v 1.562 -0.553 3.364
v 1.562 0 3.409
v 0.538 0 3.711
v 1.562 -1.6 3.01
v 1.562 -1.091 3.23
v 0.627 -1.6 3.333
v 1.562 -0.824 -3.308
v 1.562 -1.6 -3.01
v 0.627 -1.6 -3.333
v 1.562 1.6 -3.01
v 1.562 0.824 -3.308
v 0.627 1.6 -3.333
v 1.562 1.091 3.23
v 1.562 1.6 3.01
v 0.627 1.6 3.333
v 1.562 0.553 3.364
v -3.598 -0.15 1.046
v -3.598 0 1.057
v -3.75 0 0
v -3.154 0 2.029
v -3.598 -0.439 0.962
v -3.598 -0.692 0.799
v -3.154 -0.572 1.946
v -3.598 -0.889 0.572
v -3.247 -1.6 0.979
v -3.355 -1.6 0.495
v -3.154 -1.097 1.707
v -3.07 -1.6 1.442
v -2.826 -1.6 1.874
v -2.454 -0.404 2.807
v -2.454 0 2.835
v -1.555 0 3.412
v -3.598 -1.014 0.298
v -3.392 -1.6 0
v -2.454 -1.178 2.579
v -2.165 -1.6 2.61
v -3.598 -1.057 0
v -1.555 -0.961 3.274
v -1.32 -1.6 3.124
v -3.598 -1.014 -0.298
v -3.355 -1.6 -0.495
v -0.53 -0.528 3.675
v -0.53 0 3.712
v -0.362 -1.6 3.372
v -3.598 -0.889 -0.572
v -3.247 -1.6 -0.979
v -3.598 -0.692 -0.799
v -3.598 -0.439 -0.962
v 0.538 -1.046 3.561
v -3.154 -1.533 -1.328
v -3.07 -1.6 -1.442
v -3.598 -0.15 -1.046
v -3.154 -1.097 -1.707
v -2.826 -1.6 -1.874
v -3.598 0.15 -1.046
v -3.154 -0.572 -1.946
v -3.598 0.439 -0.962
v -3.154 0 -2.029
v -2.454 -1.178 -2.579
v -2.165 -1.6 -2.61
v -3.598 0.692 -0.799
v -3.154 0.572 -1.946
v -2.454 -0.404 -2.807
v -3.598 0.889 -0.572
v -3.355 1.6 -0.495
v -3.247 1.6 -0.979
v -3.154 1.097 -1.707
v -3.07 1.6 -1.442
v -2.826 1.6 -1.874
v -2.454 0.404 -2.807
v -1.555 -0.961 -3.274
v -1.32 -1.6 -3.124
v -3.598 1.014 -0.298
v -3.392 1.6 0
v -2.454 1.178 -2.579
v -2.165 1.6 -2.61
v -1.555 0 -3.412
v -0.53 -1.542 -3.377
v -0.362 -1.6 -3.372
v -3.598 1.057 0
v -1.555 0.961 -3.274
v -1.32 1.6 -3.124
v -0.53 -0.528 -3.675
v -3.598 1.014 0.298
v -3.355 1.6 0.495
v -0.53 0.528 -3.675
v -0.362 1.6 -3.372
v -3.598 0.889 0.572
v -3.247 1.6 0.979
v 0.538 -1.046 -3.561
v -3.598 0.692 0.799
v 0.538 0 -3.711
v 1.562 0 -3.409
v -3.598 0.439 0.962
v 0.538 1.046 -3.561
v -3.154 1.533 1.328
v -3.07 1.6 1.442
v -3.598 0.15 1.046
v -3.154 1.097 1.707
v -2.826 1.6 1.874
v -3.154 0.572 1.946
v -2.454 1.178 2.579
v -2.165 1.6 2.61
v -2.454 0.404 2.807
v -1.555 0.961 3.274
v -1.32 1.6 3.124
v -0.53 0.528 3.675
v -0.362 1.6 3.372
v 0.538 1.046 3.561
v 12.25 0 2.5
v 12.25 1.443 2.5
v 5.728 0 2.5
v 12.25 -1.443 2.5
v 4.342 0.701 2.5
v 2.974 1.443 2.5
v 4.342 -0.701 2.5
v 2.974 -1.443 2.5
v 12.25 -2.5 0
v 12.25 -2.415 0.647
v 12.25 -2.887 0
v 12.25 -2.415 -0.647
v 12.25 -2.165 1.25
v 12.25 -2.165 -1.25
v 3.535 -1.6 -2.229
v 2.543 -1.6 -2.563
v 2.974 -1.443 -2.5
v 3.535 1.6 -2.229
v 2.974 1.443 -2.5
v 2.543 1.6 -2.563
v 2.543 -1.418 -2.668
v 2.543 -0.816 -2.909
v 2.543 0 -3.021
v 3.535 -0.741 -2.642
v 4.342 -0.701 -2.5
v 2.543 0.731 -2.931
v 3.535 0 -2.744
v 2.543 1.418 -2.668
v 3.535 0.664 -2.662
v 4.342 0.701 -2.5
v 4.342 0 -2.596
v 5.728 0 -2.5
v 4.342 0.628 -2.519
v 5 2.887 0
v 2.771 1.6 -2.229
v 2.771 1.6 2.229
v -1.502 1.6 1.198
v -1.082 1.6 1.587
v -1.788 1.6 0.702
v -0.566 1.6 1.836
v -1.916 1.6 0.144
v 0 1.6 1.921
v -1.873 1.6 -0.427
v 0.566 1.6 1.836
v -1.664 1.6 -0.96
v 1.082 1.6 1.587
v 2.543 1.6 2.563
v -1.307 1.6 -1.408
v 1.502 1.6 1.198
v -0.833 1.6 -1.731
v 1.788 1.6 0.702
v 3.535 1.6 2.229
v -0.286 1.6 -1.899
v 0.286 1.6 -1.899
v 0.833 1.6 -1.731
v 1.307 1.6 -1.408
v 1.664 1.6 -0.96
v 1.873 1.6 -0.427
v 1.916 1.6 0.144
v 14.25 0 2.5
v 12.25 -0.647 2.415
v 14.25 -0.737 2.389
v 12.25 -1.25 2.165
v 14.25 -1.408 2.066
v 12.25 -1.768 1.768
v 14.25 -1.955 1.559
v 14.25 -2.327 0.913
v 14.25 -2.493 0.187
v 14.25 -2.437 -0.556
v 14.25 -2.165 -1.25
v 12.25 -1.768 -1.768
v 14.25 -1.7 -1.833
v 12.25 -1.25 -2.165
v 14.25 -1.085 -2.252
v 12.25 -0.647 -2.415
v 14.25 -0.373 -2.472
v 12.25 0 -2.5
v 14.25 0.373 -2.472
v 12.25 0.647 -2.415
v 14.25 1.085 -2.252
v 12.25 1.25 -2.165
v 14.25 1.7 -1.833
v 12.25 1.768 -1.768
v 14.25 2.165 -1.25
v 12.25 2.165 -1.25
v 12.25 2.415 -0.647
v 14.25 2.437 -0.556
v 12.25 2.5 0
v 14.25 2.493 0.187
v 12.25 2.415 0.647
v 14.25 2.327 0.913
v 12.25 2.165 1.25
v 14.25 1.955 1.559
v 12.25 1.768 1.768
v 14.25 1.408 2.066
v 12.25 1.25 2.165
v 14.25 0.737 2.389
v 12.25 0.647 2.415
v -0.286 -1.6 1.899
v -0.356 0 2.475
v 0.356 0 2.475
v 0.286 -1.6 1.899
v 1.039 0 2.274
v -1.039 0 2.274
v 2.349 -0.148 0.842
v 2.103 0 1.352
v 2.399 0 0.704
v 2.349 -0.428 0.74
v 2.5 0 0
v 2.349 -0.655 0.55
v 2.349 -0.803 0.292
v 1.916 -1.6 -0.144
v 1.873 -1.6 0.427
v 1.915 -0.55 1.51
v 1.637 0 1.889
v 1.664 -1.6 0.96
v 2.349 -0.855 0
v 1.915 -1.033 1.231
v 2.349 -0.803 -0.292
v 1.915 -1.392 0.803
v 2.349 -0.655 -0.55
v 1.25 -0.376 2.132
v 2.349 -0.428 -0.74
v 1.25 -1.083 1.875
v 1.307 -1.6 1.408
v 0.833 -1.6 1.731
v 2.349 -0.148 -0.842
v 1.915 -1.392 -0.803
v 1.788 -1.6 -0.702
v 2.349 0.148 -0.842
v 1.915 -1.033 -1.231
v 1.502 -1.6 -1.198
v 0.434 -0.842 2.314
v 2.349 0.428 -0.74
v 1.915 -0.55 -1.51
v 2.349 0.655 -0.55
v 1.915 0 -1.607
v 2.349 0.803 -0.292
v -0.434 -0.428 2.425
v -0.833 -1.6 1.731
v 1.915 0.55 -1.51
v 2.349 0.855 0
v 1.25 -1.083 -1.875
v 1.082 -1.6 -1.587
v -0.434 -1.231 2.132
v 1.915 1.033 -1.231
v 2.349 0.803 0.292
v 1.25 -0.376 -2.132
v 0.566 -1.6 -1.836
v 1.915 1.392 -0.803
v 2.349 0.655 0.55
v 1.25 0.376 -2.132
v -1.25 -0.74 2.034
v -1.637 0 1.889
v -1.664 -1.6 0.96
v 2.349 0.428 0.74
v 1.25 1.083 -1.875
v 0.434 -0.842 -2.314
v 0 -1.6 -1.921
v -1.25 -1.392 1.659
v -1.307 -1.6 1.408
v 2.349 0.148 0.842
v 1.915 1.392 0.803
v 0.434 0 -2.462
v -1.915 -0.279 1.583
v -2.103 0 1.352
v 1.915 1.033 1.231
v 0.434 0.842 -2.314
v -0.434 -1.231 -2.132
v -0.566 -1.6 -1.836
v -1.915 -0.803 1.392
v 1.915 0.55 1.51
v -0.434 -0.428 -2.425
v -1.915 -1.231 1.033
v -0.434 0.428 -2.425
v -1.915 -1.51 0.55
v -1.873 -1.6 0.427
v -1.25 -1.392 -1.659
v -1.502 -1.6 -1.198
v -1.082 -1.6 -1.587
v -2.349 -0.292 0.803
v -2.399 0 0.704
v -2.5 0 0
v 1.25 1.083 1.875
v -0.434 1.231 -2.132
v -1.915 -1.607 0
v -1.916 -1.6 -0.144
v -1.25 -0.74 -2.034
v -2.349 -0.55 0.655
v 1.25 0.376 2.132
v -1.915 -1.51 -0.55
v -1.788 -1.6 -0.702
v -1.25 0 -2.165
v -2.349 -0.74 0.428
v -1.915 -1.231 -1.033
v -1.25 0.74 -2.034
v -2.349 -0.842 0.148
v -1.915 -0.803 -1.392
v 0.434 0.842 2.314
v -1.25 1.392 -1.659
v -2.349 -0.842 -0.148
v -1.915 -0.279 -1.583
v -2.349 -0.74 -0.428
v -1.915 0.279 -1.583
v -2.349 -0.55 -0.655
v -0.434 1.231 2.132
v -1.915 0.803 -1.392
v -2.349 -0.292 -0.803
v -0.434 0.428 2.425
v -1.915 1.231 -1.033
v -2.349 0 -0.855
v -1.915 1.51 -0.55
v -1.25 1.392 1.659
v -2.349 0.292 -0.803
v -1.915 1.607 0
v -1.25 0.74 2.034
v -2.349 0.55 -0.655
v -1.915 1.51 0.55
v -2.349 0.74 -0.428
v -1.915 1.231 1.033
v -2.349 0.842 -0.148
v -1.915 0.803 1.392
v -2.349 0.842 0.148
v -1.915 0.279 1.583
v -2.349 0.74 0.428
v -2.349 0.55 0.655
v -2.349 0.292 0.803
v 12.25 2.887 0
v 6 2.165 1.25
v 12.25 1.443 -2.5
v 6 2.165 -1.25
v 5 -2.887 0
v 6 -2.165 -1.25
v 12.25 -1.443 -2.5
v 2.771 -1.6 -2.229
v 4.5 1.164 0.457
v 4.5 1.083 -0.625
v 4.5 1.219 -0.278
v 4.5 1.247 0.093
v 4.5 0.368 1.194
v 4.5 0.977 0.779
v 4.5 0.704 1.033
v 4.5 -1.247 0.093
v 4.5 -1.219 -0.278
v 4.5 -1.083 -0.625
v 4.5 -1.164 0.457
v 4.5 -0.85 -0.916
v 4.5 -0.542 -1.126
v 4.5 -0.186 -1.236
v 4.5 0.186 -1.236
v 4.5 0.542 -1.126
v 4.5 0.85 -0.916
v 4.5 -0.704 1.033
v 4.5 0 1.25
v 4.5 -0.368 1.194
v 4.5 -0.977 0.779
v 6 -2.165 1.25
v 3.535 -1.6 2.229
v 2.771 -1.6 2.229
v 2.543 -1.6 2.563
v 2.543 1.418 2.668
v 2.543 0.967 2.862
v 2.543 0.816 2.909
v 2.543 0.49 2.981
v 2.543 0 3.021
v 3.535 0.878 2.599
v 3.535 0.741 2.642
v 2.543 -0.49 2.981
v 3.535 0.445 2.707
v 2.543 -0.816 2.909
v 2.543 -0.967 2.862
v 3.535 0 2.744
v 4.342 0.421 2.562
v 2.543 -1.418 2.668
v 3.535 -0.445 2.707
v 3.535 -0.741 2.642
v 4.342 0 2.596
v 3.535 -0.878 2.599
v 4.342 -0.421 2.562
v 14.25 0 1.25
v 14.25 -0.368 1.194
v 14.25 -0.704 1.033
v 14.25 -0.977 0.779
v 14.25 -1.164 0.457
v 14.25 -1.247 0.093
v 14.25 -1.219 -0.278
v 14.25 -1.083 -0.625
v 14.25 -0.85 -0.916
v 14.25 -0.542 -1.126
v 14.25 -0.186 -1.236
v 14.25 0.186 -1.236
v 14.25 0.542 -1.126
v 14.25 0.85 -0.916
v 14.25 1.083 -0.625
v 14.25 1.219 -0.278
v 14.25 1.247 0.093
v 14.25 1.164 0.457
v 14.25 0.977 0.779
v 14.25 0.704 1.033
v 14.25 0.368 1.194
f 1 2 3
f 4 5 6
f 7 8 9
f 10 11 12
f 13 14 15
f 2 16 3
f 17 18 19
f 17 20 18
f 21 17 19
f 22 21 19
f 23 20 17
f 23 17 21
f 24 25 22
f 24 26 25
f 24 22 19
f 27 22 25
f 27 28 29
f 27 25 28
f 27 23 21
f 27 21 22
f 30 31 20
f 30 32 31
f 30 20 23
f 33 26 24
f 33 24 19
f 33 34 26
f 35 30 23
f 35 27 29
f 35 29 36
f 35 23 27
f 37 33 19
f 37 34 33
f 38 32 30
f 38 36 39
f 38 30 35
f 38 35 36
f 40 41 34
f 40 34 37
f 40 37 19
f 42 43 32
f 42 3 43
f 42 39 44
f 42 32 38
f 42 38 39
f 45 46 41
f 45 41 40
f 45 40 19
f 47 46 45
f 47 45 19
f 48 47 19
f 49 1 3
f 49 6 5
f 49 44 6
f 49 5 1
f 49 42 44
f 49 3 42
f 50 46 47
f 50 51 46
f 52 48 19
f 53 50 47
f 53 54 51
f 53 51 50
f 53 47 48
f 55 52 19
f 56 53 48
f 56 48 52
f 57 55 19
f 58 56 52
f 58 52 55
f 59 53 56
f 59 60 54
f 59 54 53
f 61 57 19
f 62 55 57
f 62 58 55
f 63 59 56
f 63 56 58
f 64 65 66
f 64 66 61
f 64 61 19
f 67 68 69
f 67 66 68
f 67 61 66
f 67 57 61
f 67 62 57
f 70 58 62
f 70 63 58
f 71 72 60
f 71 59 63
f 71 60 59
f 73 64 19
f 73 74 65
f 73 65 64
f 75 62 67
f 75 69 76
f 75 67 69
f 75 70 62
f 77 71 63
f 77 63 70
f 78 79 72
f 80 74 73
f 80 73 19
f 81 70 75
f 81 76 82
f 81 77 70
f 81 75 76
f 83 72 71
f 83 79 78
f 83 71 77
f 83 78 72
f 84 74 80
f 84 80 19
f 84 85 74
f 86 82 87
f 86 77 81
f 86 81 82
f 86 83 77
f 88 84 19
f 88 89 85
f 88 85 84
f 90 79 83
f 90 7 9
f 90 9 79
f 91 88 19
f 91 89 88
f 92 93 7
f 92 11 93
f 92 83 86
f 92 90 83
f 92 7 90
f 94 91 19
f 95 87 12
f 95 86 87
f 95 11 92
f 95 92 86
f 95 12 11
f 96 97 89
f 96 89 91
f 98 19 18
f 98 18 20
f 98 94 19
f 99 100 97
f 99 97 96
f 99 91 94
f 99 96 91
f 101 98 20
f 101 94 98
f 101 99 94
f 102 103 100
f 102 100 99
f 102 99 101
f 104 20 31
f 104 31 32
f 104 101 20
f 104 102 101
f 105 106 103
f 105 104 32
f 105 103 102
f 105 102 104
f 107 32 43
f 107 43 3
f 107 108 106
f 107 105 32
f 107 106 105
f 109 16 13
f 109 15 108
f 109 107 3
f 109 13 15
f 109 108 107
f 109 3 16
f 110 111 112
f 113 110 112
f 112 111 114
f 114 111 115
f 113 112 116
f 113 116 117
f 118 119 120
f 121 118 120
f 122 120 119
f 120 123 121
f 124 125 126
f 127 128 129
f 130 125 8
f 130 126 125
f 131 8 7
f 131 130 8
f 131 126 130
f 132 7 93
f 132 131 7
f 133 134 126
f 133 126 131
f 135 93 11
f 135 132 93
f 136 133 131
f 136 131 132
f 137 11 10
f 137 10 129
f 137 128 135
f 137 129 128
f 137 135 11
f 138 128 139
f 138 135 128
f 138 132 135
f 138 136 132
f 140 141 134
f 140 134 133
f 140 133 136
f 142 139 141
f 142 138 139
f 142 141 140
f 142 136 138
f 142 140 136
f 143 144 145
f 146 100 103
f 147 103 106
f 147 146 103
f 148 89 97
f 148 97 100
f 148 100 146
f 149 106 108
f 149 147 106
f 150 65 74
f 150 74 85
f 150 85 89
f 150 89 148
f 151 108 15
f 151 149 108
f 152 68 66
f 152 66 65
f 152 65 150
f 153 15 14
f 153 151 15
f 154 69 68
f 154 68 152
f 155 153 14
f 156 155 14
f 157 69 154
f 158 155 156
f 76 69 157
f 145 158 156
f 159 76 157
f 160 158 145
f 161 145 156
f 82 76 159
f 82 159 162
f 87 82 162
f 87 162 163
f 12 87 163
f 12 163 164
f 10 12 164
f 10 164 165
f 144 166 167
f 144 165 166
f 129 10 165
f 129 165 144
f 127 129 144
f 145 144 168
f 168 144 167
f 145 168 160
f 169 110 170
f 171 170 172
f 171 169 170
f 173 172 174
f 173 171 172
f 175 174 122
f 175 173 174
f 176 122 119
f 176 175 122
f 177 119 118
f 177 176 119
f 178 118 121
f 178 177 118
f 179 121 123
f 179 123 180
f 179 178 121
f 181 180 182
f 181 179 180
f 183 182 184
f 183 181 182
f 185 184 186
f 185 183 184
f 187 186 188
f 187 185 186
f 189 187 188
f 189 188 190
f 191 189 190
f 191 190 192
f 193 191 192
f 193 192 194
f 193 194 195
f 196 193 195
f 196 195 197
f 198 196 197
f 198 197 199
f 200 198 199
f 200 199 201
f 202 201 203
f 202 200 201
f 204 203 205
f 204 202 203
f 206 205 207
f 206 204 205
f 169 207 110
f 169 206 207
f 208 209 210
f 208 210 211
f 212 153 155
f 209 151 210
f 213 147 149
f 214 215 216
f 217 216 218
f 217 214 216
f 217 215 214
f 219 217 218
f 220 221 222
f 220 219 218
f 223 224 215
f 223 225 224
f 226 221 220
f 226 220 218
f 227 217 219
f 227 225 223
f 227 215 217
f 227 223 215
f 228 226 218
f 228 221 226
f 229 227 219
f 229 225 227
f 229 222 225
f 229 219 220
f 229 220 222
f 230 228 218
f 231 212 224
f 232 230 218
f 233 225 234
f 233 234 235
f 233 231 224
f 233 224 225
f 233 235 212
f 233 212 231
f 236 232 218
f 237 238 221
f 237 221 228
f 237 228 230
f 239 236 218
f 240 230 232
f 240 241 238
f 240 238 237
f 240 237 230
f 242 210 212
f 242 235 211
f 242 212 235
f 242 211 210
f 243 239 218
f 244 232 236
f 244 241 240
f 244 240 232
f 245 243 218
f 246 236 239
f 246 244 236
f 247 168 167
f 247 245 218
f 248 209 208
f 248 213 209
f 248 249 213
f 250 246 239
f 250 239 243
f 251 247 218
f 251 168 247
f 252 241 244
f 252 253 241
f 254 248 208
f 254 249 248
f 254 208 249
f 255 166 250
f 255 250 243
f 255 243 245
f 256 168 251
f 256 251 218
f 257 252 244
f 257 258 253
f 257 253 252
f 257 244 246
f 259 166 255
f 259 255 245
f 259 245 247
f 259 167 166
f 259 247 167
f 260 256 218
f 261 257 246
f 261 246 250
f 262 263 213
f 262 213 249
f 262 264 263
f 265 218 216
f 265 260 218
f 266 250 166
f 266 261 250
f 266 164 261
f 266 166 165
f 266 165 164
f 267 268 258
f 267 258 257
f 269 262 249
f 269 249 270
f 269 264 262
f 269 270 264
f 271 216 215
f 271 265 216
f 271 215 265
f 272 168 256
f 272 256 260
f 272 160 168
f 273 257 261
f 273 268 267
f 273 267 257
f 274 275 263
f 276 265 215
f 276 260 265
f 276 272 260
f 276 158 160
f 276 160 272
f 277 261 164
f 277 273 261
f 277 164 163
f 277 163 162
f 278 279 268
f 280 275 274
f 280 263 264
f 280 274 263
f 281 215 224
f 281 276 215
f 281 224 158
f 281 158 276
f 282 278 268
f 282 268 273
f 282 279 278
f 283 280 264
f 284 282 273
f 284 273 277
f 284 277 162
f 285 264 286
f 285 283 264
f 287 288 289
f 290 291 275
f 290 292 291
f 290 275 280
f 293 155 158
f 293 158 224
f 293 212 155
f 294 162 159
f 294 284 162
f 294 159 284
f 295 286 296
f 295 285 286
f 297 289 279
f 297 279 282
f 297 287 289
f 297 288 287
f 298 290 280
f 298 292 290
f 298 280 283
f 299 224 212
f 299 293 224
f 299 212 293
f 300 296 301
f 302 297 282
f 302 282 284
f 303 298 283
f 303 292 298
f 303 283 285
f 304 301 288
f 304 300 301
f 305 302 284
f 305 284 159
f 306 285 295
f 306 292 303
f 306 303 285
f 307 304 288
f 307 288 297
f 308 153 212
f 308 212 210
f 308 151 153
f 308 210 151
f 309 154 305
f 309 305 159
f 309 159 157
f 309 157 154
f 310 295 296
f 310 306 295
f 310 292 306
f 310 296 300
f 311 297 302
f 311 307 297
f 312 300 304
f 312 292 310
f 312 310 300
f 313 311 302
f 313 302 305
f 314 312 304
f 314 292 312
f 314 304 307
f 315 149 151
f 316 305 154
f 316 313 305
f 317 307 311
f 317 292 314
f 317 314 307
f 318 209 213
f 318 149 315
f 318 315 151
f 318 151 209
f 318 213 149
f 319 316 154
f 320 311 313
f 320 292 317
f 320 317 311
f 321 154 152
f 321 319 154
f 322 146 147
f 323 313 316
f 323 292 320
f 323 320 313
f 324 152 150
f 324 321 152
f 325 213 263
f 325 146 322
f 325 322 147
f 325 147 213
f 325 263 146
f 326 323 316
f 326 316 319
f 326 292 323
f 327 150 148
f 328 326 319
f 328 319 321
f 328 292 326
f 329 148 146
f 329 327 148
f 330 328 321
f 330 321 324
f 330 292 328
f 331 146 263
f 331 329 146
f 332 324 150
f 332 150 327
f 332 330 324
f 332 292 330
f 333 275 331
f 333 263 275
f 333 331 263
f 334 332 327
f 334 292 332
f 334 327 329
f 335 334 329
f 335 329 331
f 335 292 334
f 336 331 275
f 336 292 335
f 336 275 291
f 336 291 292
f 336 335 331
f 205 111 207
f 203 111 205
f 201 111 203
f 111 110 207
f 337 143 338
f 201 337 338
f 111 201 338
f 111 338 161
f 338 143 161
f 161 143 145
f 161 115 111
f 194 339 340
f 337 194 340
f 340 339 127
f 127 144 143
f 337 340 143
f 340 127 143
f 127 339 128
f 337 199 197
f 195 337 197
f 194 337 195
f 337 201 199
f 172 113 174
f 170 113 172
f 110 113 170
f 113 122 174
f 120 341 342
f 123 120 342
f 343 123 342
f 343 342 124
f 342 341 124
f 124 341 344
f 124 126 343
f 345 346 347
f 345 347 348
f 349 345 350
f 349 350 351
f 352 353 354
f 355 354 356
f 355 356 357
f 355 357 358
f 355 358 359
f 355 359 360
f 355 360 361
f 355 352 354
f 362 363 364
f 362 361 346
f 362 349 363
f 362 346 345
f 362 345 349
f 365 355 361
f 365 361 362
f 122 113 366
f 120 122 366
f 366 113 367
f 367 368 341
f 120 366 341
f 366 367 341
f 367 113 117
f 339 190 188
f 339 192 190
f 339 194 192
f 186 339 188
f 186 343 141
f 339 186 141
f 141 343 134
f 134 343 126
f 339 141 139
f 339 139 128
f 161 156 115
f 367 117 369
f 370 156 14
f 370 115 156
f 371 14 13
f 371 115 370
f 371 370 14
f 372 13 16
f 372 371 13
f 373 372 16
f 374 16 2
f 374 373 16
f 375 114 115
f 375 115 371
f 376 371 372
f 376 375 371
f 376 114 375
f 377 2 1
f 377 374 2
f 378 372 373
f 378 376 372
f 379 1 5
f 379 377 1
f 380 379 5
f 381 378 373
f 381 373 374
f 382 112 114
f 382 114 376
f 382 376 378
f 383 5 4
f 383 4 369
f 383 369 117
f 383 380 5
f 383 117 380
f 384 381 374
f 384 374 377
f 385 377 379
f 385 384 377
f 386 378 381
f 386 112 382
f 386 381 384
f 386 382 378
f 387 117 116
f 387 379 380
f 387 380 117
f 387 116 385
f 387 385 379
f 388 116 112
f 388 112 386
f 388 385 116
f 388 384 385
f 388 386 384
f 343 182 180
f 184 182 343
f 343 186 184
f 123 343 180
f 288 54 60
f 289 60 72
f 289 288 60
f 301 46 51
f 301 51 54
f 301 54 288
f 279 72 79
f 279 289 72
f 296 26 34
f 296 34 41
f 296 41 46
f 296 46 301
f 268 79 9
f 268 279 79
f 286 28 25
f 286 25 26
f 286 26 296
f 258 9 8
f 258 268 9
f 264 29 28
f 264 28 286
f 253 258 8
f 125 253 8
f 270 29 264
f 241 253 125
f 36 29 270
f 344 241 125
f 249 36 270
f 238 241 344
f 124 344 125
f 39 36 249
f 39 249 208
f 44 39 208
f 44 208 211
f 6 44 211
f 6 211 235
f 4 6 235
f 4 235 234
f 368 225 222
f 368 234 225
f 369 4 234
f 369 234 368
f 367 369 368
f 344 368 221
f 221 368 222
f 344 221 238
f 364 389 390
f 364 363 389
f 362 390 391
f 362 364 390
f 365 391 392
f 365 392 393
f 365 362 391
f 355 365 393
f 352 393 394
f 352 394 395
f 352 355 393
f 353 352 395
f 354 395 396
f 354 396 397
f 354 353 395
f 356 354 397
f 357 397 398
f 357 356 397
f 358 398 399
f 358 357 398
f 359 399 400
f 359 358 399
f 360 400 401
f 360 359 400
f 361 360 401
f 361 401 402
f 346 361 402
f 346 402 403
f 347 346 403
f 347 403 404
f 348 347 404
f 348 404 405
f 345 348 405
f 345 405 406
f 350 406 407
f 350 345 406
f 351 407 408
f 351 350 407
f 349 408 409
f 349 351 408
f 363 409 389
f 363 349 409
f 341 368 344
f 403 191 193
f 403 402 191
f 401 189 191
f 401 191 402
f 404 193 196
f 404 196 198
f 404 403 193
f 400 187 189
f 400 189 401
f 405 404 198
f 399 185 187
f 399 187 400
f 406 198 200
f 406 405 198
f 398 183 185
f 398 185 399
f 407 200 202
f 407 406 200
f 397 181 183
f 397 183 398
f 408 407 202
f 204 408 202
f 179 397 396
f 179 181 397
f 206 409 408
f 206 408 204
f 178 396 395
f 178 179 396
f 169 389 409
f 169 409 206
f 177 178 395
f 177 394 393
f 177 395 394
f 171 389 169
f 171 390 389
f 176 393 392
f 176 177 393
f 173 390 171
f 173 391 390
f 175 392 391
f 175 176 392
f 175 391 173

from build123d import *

# Parameters (mm, degrees)
ESQUISSE3_W             = 9.75
ESQUISSE3_H             = 2.4
ENL_V_MAT_EXTRU_1_DEPTH = 5
BOSS_EXTRU_1_START      = -12
ESQUISSE2_R             = 1.25
BOSS_EXTRU_1_DEPTH      = 10
ENL_V_MAT_EXTRU_2_DEPTH = 5


with BuildPart() as part:
    # Esquisse1 → Révolution1 (revolve)
    with BuildSketch(Plane.XY, mode=Mode.PRIVATE) as r_volution1_sk:
        with BuildLine():
            Line((-2.5, 0), (-3.75, 0))
            ThreePointArc((-3.75, 0), (-2.025351028, 3.15601857), (1.562241714, 3.409090909))
            ThreePointArc((1.562241714, 3.409090909), (3.596212455, 2.729915791), (5.728219619, 2.5))
            Line((5.728219619, 2.5), (14.25, 2.5))
            Line((14.25, 2.5), (14.25, 1.25))
            Line((14.25, 1.25), (4.5, 1.25))
            Line((4.5, 1.25), (4.5, 0))
            Line((4.5, 0), (2.5, 0))
            ThreePointArc((2.5, 0), (0, 2.5), (-2.5, 0))
        make_face()
    revolve(r_volution1_sk.sketch.rotate(Axis((4.5, 0, 0), (1, 0, 0)), 90), axis=Axis((4.5, 0, 0), (1, 0, 0)))

    # Esquisse3 → Enlèv. mat.-Extru.1 (cut, symmetric)
    with BuildSketch(Plane.XY):
        with Locations((1.125, 2.8)):
            Rectangle(ESQUISSE3_W, ESQUISSE3_H)
        with Locations((1.125, -2.8)):
            Rectangle(ESQUISSE3_W, ESQUISSE3_H)
    extrude(amount=ENL_V_MAT_EXTRU_1_DEPTH, both=True, mode=Mode.SUBTRACT)

    # Esquisse2 → Boss.-Extru.1 (add)
    with BuildSketch(Plane(origin=(14.25, 0, 0), x_dir=(0, 0, -1), z_dir=(1, 0, 0)).offset(BOSS_EXTRU_1_START)):
        Polygon((0, 2.886751346), (-2.5, 1.443375673), (-2.5, -1.443375673), (0, -2.886751346), (2.5, -1.443375673), (2.5, 1.443375673), align=None)
        with Locations(Location((0, 0, 0), (0, 0, 180))):
            Circle(ESQUISSE2_R, mode=Mode.SUBTRACT)
    extrude(amount=BOSS_EXTRU_1_DEPTH)

    # Esquisse4 → Enlèv. mat.-Extru.2 (cut, symmetric)
    with BuildSketch(Plane.XY):
        Polygon((2.771281292, 1.6), (5, 2.886751346), (-3.75, 2.886751346), (-3.75, 1.6), align=None)
        Polygon((-3.75, -1.6), (2.771281292, -1.6), (5, -2.886751346), (-3.75, -2.886751346), align=None)
    extrude(amount=ENL_V_MAT_EXTRU_2_DEPTH, both=True, mode=Mode.SUBTRACT)


solid = part.part
